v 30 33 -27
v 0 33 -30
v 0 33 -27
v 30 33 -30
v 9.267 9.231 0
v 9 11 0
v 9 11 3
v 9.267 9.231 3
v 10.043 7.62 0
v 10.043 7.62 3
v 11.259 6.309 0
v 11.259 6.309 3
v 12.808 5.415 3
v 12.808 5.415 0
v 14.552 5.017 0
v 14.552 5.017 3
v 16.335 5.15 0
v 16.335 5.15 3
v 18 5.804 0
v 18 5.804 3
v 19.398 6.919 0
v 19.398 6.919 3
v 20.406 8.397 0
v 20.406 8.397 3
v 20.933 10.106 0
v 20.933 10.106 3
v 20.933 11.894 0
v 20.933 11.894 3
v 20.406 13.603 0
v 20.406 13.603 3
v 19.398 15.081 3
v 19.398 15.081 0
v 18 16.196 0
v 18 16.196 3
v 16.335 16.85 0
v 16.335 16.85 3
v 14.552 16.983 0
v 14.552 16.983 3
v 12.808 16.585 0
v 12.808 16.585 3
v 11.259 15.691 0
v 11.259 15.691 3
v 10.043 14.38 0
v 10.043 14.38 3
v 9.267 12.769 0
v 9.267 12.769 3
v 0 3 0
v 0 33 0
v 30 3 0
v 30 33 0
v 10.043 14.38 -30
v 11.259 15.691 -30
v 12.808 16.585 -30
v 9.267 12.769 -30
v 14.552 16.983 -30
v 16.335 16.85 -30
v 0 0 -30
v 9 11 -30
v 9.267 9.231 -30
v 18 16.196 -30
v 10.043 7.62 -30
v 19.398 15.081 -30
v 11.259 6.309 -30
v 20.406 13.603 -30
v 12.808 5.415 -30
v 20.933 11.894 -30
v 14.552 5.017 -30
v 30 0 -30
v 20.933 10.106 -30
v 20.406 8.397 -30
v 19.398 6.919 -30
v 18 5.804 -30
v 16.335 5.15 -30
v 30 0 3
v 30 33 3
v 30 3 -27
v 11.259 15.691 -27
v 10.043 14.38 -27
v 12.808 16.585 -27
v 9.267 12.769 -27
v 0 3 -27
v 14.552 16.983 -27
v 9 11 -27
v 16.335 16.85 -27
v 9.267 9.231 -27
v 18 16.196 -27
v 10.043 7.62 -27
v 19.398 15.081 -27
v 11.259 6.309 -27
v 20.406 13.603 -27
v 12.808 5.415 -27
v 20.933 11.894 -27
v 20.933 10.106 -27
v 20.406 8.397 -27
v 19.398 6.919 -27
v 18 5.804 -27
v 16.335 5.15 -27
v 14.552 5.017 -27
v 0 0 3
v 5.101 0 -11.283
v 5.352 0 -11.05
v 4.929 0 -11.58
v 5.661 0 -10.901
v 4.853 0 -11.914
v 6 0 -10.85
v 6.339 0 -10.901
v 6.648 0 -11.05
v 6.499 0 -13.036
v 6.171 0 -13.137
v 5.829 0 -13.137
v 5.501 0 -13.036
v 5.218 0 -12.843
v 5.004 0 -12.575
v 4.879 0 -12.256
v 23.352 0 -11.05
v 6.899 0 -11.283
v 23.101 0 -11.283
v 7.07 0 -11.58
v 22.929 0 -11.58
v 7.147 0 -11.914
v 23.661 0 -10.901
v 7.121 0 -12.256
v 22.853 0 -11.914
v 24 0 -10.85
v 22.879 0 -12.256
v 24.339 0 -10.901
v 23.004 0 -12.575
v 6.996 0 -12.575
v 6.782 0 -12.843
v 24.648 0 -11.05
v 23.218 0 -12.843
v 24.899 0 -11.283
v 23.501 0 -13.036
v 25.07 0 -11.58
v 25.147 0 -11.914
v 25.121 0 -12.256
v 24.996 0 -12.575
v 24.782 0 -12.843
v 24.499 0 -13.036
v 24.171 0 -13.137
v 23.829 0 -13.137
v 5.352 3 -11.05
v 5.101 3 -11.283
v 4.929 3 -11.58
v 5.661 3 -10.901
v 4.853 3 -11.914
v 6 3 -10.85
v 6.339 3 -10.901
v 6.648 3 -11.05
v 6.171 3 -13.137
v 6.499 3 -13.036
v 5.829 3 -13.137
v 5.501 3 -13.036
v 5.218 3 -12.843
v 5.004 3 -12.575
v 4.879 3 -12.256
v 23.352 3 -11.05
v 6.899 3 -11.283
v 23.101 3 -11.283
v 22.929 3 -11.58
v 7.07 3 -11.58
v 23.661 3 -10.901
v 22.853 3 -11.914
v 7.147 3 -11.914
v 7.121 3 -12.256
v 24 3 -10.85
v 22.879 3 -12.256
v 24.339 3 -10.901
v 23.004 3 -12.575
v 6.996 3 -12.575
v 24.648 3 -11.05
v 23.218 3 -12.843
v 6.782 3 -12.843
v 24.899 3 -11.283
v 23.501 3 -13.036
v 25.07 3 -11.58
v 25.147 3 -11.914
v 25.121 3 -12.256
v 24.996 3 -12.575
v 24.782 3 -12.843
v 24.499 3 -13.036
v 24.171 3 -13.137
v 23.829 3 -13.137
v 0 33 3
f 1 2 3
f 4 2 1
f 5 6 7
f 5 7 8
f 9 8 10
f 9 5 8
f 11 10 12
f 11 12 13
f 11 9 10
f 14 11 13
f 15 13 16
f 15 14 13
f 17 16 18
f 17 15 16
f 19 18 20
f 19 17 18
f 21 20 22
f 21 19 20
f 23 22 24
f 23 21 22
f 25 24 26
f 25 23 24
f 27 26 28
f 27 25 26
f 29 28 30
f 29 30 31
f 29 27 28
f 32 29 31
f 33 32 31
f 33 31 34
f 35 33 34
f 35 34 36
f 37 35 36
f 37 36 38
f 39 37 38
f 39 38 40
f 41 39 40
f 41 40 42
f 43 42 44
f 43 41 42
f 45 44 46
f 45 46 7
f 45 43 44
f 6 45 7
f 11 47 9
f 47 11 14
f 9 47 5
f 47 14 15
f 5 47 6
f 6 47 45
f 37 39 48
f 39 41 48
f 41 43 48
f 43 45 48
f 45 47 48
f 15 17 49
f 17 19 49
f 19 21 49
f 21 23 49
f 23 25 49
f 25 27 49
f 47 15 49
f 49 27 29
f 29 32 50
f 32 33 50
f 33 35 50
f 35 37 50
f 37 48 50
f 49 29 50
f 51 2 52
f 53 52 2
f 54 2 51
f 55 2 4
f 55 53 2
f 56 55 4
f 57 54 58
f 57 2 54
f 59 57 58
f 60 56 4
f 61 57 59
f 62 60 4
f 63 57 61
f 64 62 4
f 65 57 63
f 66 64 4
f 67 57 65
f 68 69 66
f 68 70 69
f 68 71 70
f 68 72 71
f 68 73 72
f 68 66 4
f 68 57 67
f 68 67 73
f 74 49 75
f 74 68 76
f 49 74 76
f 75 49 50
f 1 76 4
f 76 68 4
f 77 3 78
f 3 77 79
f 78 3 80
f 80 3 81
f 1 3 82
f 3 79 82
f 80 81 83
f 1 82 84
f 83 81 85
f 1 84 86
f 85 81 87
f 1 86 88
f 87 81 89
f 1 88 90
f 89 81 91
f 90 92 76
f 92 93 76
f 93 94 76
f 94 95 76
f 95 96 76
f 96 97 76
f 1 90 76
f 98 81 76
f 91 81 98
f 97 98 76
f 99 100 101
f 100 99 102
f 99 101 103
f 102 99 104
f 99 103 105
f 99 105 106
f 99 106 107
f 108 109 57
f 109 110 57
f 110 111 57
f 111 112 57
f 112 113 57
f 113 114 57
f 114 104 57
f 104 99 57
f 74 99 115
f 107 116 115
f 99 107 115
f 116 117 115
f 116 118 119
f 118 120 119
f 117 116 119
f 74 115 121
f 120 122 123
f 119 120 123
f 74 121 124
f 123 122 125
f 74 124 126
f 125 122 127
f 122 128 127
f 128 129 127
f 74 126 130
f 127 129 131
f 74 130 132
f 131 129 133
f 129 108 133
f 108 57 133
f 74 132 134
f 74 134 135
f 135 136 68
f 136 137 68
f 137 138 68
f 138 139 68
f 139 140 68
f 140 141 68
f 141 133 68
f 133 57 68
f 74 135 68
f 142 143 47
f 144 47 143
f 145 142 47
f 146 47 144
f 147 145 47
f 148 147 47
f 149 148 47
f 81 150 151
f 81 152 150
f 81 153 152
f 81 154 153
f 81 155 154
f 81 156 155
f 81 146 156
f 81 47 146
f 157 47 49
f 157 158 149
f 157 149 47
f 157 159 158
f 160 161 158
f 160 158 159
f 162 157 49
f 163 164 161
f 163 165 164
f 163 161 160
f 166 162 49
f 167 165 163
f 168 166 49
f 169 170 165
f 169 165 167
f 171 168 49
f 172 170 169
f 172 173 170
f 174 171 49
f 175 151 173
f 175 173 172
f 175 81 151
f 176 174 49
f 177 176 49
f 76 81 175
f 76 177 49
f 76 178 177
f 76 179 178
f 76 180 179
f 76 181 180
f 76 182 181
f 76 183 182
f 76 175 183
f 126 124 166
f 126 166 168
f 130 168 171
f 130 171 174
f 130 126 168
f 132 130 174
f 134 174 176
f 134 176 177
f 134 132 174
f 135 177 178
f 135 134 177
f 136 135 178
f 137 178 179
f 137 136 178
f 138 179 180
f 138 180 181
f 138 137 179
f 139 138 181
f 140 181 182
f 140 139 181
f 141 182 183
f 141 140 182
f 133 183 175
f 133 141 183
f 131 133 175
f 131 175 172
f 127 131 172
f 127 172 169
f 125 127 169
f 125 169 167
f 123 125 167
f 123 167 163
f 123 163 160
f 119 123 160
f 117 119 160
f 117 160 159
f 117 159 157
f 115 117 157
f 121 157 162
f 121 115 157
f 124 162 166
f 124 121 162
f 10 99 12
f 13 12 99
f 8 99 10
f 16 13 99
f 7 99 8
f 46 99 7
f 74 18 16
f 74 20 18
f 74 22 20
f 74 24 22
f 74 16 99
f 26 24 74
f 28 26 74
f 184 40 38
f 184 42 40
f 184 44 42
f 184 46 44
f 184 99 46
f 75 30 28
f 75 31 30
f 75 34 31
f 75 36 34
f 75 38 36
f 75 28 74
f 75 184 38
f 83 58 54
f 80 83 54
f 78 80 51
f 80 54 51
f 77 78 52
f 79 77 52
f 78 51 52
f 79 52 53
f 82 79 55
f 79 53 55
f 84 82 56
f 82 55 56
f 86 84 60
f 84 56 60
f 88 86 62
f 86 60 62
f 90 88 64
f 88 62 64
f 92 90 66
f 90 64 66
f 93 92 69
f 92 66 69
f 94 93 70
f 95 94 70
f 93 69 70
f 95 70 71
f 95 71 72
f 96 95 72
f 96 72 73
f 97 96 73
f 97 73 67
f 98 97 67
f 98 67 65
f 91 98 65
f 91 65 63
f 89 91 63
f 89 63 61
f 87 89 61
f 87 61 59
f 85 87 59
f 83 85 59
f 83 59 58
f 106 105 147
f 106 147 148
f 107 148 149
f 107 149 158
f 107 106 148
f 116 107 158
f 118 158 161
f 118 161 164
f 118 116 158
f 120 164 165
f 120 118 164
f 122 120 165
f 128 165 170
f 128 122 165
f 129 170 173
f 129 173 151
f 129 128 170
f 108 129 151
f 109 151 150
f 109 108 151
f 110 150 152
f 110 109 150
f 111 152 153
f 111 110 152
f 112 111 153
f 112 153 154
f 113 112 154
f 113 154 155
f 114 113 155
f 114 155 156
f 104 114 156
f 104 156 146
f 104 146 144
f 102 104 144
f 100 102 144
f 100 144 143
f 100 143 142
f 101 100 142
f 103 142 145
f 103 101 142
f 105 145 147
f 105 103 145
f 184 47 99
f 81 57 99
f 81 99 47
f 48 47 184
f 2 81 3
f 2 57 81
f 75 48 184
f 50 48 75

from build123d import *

# Parameters (mm, degrees)
SKETCH1_W           = 30
SKETCH1_H           = 30
SKETCH1_R           = 1.15
BOSS_EXTRUDE1_DEPTH = 3
SKETCH2_W           = 30
SKETCH2_H           = 3
BOSS_EXTRUDE2_DEPTH = 30
CUT_EXTRUDE1_REACH  = 55.749
SKETCH3_R           = 6
SKETCH4_W           = 30
SKETCH4_H           = 33
SKETCH4_R           = 6
BOSS_EXTRUDE3_DEPTH = 3


with BuildPart() as part:
    # Sketch1 → Boss-Extrude1 (new body)
    with BuildSketch(Plane(origin=(0, 0, 0), x_dir=(1, 0, 0), z_dir=(0, 1, 0))):
        with Locations((15, 15)):
            Rectangle(SKETCH1_W, SKETCH1_H)
        with Locations(Location((5.999988, 12, 0), (0, 0, 270))):
            Circle(SKETCH1_R, mode=Mode.SUBTRACT)
        with Locations(Location((23.999988, 12, 0), (0, 0, 270))):
            Circle(SKETCH1_R, mode=Mode.SUBTRACT)
    extrude(amount=BOSS_EXTRUDE1_DEPTH)

    # Sketch2 → Boss-Extrude2 (add)
    with BuildSketch(Plane(origin=(0, 3, 0), x_dir=(1, 0, 0), z_dir=(0, 1, 0))):
        with Locations((15, 28.5)):
            Rectangle(SKETCH2_W, SKETCH2_H)
    extrude(amount=BOSS_EXTRUDE2_DEPTH)

    # Sketch3 → Cut-Extrude1 (cut, up to next)
    with BuildSketch(Plane(origin=(0, 0, -30), x_dir=(-1, 0, 0), z_dir=(0, 0, -1)), mode=Mode.PRIVATE) as cut_extrude1_sk1:
        with Locations((-15, 11)):
            Circle(SKETCH3_R)
    cut_extrude1_tool1 = extrude(cut_extrude1_sk1.sketch, amount=-CUT_EXTRUDE1_REACH, mode=Mode.PRIVATE) & part.part
    add(cut_extrude1_tool1.solids().sort_by_distance((15, 11, -30))[0], mode=Mode.SUBTRACT)

    # Sketch4 → Boss-Extrude3 (add)
    with BuildSketch(Plane.XY):
        with Locations((15, 16.5)):
            Rectangle(SKETCH4_W, SKETCH4_H)
        with Locations(Location((15, 11, 0), (0, 0, 180))):
            Circle(SKETCH4_R, mode=Mode.SUBTRACT)
    extrude(amount=BOSS_EXTRUDE3_DEPTH)


solid = part.part
